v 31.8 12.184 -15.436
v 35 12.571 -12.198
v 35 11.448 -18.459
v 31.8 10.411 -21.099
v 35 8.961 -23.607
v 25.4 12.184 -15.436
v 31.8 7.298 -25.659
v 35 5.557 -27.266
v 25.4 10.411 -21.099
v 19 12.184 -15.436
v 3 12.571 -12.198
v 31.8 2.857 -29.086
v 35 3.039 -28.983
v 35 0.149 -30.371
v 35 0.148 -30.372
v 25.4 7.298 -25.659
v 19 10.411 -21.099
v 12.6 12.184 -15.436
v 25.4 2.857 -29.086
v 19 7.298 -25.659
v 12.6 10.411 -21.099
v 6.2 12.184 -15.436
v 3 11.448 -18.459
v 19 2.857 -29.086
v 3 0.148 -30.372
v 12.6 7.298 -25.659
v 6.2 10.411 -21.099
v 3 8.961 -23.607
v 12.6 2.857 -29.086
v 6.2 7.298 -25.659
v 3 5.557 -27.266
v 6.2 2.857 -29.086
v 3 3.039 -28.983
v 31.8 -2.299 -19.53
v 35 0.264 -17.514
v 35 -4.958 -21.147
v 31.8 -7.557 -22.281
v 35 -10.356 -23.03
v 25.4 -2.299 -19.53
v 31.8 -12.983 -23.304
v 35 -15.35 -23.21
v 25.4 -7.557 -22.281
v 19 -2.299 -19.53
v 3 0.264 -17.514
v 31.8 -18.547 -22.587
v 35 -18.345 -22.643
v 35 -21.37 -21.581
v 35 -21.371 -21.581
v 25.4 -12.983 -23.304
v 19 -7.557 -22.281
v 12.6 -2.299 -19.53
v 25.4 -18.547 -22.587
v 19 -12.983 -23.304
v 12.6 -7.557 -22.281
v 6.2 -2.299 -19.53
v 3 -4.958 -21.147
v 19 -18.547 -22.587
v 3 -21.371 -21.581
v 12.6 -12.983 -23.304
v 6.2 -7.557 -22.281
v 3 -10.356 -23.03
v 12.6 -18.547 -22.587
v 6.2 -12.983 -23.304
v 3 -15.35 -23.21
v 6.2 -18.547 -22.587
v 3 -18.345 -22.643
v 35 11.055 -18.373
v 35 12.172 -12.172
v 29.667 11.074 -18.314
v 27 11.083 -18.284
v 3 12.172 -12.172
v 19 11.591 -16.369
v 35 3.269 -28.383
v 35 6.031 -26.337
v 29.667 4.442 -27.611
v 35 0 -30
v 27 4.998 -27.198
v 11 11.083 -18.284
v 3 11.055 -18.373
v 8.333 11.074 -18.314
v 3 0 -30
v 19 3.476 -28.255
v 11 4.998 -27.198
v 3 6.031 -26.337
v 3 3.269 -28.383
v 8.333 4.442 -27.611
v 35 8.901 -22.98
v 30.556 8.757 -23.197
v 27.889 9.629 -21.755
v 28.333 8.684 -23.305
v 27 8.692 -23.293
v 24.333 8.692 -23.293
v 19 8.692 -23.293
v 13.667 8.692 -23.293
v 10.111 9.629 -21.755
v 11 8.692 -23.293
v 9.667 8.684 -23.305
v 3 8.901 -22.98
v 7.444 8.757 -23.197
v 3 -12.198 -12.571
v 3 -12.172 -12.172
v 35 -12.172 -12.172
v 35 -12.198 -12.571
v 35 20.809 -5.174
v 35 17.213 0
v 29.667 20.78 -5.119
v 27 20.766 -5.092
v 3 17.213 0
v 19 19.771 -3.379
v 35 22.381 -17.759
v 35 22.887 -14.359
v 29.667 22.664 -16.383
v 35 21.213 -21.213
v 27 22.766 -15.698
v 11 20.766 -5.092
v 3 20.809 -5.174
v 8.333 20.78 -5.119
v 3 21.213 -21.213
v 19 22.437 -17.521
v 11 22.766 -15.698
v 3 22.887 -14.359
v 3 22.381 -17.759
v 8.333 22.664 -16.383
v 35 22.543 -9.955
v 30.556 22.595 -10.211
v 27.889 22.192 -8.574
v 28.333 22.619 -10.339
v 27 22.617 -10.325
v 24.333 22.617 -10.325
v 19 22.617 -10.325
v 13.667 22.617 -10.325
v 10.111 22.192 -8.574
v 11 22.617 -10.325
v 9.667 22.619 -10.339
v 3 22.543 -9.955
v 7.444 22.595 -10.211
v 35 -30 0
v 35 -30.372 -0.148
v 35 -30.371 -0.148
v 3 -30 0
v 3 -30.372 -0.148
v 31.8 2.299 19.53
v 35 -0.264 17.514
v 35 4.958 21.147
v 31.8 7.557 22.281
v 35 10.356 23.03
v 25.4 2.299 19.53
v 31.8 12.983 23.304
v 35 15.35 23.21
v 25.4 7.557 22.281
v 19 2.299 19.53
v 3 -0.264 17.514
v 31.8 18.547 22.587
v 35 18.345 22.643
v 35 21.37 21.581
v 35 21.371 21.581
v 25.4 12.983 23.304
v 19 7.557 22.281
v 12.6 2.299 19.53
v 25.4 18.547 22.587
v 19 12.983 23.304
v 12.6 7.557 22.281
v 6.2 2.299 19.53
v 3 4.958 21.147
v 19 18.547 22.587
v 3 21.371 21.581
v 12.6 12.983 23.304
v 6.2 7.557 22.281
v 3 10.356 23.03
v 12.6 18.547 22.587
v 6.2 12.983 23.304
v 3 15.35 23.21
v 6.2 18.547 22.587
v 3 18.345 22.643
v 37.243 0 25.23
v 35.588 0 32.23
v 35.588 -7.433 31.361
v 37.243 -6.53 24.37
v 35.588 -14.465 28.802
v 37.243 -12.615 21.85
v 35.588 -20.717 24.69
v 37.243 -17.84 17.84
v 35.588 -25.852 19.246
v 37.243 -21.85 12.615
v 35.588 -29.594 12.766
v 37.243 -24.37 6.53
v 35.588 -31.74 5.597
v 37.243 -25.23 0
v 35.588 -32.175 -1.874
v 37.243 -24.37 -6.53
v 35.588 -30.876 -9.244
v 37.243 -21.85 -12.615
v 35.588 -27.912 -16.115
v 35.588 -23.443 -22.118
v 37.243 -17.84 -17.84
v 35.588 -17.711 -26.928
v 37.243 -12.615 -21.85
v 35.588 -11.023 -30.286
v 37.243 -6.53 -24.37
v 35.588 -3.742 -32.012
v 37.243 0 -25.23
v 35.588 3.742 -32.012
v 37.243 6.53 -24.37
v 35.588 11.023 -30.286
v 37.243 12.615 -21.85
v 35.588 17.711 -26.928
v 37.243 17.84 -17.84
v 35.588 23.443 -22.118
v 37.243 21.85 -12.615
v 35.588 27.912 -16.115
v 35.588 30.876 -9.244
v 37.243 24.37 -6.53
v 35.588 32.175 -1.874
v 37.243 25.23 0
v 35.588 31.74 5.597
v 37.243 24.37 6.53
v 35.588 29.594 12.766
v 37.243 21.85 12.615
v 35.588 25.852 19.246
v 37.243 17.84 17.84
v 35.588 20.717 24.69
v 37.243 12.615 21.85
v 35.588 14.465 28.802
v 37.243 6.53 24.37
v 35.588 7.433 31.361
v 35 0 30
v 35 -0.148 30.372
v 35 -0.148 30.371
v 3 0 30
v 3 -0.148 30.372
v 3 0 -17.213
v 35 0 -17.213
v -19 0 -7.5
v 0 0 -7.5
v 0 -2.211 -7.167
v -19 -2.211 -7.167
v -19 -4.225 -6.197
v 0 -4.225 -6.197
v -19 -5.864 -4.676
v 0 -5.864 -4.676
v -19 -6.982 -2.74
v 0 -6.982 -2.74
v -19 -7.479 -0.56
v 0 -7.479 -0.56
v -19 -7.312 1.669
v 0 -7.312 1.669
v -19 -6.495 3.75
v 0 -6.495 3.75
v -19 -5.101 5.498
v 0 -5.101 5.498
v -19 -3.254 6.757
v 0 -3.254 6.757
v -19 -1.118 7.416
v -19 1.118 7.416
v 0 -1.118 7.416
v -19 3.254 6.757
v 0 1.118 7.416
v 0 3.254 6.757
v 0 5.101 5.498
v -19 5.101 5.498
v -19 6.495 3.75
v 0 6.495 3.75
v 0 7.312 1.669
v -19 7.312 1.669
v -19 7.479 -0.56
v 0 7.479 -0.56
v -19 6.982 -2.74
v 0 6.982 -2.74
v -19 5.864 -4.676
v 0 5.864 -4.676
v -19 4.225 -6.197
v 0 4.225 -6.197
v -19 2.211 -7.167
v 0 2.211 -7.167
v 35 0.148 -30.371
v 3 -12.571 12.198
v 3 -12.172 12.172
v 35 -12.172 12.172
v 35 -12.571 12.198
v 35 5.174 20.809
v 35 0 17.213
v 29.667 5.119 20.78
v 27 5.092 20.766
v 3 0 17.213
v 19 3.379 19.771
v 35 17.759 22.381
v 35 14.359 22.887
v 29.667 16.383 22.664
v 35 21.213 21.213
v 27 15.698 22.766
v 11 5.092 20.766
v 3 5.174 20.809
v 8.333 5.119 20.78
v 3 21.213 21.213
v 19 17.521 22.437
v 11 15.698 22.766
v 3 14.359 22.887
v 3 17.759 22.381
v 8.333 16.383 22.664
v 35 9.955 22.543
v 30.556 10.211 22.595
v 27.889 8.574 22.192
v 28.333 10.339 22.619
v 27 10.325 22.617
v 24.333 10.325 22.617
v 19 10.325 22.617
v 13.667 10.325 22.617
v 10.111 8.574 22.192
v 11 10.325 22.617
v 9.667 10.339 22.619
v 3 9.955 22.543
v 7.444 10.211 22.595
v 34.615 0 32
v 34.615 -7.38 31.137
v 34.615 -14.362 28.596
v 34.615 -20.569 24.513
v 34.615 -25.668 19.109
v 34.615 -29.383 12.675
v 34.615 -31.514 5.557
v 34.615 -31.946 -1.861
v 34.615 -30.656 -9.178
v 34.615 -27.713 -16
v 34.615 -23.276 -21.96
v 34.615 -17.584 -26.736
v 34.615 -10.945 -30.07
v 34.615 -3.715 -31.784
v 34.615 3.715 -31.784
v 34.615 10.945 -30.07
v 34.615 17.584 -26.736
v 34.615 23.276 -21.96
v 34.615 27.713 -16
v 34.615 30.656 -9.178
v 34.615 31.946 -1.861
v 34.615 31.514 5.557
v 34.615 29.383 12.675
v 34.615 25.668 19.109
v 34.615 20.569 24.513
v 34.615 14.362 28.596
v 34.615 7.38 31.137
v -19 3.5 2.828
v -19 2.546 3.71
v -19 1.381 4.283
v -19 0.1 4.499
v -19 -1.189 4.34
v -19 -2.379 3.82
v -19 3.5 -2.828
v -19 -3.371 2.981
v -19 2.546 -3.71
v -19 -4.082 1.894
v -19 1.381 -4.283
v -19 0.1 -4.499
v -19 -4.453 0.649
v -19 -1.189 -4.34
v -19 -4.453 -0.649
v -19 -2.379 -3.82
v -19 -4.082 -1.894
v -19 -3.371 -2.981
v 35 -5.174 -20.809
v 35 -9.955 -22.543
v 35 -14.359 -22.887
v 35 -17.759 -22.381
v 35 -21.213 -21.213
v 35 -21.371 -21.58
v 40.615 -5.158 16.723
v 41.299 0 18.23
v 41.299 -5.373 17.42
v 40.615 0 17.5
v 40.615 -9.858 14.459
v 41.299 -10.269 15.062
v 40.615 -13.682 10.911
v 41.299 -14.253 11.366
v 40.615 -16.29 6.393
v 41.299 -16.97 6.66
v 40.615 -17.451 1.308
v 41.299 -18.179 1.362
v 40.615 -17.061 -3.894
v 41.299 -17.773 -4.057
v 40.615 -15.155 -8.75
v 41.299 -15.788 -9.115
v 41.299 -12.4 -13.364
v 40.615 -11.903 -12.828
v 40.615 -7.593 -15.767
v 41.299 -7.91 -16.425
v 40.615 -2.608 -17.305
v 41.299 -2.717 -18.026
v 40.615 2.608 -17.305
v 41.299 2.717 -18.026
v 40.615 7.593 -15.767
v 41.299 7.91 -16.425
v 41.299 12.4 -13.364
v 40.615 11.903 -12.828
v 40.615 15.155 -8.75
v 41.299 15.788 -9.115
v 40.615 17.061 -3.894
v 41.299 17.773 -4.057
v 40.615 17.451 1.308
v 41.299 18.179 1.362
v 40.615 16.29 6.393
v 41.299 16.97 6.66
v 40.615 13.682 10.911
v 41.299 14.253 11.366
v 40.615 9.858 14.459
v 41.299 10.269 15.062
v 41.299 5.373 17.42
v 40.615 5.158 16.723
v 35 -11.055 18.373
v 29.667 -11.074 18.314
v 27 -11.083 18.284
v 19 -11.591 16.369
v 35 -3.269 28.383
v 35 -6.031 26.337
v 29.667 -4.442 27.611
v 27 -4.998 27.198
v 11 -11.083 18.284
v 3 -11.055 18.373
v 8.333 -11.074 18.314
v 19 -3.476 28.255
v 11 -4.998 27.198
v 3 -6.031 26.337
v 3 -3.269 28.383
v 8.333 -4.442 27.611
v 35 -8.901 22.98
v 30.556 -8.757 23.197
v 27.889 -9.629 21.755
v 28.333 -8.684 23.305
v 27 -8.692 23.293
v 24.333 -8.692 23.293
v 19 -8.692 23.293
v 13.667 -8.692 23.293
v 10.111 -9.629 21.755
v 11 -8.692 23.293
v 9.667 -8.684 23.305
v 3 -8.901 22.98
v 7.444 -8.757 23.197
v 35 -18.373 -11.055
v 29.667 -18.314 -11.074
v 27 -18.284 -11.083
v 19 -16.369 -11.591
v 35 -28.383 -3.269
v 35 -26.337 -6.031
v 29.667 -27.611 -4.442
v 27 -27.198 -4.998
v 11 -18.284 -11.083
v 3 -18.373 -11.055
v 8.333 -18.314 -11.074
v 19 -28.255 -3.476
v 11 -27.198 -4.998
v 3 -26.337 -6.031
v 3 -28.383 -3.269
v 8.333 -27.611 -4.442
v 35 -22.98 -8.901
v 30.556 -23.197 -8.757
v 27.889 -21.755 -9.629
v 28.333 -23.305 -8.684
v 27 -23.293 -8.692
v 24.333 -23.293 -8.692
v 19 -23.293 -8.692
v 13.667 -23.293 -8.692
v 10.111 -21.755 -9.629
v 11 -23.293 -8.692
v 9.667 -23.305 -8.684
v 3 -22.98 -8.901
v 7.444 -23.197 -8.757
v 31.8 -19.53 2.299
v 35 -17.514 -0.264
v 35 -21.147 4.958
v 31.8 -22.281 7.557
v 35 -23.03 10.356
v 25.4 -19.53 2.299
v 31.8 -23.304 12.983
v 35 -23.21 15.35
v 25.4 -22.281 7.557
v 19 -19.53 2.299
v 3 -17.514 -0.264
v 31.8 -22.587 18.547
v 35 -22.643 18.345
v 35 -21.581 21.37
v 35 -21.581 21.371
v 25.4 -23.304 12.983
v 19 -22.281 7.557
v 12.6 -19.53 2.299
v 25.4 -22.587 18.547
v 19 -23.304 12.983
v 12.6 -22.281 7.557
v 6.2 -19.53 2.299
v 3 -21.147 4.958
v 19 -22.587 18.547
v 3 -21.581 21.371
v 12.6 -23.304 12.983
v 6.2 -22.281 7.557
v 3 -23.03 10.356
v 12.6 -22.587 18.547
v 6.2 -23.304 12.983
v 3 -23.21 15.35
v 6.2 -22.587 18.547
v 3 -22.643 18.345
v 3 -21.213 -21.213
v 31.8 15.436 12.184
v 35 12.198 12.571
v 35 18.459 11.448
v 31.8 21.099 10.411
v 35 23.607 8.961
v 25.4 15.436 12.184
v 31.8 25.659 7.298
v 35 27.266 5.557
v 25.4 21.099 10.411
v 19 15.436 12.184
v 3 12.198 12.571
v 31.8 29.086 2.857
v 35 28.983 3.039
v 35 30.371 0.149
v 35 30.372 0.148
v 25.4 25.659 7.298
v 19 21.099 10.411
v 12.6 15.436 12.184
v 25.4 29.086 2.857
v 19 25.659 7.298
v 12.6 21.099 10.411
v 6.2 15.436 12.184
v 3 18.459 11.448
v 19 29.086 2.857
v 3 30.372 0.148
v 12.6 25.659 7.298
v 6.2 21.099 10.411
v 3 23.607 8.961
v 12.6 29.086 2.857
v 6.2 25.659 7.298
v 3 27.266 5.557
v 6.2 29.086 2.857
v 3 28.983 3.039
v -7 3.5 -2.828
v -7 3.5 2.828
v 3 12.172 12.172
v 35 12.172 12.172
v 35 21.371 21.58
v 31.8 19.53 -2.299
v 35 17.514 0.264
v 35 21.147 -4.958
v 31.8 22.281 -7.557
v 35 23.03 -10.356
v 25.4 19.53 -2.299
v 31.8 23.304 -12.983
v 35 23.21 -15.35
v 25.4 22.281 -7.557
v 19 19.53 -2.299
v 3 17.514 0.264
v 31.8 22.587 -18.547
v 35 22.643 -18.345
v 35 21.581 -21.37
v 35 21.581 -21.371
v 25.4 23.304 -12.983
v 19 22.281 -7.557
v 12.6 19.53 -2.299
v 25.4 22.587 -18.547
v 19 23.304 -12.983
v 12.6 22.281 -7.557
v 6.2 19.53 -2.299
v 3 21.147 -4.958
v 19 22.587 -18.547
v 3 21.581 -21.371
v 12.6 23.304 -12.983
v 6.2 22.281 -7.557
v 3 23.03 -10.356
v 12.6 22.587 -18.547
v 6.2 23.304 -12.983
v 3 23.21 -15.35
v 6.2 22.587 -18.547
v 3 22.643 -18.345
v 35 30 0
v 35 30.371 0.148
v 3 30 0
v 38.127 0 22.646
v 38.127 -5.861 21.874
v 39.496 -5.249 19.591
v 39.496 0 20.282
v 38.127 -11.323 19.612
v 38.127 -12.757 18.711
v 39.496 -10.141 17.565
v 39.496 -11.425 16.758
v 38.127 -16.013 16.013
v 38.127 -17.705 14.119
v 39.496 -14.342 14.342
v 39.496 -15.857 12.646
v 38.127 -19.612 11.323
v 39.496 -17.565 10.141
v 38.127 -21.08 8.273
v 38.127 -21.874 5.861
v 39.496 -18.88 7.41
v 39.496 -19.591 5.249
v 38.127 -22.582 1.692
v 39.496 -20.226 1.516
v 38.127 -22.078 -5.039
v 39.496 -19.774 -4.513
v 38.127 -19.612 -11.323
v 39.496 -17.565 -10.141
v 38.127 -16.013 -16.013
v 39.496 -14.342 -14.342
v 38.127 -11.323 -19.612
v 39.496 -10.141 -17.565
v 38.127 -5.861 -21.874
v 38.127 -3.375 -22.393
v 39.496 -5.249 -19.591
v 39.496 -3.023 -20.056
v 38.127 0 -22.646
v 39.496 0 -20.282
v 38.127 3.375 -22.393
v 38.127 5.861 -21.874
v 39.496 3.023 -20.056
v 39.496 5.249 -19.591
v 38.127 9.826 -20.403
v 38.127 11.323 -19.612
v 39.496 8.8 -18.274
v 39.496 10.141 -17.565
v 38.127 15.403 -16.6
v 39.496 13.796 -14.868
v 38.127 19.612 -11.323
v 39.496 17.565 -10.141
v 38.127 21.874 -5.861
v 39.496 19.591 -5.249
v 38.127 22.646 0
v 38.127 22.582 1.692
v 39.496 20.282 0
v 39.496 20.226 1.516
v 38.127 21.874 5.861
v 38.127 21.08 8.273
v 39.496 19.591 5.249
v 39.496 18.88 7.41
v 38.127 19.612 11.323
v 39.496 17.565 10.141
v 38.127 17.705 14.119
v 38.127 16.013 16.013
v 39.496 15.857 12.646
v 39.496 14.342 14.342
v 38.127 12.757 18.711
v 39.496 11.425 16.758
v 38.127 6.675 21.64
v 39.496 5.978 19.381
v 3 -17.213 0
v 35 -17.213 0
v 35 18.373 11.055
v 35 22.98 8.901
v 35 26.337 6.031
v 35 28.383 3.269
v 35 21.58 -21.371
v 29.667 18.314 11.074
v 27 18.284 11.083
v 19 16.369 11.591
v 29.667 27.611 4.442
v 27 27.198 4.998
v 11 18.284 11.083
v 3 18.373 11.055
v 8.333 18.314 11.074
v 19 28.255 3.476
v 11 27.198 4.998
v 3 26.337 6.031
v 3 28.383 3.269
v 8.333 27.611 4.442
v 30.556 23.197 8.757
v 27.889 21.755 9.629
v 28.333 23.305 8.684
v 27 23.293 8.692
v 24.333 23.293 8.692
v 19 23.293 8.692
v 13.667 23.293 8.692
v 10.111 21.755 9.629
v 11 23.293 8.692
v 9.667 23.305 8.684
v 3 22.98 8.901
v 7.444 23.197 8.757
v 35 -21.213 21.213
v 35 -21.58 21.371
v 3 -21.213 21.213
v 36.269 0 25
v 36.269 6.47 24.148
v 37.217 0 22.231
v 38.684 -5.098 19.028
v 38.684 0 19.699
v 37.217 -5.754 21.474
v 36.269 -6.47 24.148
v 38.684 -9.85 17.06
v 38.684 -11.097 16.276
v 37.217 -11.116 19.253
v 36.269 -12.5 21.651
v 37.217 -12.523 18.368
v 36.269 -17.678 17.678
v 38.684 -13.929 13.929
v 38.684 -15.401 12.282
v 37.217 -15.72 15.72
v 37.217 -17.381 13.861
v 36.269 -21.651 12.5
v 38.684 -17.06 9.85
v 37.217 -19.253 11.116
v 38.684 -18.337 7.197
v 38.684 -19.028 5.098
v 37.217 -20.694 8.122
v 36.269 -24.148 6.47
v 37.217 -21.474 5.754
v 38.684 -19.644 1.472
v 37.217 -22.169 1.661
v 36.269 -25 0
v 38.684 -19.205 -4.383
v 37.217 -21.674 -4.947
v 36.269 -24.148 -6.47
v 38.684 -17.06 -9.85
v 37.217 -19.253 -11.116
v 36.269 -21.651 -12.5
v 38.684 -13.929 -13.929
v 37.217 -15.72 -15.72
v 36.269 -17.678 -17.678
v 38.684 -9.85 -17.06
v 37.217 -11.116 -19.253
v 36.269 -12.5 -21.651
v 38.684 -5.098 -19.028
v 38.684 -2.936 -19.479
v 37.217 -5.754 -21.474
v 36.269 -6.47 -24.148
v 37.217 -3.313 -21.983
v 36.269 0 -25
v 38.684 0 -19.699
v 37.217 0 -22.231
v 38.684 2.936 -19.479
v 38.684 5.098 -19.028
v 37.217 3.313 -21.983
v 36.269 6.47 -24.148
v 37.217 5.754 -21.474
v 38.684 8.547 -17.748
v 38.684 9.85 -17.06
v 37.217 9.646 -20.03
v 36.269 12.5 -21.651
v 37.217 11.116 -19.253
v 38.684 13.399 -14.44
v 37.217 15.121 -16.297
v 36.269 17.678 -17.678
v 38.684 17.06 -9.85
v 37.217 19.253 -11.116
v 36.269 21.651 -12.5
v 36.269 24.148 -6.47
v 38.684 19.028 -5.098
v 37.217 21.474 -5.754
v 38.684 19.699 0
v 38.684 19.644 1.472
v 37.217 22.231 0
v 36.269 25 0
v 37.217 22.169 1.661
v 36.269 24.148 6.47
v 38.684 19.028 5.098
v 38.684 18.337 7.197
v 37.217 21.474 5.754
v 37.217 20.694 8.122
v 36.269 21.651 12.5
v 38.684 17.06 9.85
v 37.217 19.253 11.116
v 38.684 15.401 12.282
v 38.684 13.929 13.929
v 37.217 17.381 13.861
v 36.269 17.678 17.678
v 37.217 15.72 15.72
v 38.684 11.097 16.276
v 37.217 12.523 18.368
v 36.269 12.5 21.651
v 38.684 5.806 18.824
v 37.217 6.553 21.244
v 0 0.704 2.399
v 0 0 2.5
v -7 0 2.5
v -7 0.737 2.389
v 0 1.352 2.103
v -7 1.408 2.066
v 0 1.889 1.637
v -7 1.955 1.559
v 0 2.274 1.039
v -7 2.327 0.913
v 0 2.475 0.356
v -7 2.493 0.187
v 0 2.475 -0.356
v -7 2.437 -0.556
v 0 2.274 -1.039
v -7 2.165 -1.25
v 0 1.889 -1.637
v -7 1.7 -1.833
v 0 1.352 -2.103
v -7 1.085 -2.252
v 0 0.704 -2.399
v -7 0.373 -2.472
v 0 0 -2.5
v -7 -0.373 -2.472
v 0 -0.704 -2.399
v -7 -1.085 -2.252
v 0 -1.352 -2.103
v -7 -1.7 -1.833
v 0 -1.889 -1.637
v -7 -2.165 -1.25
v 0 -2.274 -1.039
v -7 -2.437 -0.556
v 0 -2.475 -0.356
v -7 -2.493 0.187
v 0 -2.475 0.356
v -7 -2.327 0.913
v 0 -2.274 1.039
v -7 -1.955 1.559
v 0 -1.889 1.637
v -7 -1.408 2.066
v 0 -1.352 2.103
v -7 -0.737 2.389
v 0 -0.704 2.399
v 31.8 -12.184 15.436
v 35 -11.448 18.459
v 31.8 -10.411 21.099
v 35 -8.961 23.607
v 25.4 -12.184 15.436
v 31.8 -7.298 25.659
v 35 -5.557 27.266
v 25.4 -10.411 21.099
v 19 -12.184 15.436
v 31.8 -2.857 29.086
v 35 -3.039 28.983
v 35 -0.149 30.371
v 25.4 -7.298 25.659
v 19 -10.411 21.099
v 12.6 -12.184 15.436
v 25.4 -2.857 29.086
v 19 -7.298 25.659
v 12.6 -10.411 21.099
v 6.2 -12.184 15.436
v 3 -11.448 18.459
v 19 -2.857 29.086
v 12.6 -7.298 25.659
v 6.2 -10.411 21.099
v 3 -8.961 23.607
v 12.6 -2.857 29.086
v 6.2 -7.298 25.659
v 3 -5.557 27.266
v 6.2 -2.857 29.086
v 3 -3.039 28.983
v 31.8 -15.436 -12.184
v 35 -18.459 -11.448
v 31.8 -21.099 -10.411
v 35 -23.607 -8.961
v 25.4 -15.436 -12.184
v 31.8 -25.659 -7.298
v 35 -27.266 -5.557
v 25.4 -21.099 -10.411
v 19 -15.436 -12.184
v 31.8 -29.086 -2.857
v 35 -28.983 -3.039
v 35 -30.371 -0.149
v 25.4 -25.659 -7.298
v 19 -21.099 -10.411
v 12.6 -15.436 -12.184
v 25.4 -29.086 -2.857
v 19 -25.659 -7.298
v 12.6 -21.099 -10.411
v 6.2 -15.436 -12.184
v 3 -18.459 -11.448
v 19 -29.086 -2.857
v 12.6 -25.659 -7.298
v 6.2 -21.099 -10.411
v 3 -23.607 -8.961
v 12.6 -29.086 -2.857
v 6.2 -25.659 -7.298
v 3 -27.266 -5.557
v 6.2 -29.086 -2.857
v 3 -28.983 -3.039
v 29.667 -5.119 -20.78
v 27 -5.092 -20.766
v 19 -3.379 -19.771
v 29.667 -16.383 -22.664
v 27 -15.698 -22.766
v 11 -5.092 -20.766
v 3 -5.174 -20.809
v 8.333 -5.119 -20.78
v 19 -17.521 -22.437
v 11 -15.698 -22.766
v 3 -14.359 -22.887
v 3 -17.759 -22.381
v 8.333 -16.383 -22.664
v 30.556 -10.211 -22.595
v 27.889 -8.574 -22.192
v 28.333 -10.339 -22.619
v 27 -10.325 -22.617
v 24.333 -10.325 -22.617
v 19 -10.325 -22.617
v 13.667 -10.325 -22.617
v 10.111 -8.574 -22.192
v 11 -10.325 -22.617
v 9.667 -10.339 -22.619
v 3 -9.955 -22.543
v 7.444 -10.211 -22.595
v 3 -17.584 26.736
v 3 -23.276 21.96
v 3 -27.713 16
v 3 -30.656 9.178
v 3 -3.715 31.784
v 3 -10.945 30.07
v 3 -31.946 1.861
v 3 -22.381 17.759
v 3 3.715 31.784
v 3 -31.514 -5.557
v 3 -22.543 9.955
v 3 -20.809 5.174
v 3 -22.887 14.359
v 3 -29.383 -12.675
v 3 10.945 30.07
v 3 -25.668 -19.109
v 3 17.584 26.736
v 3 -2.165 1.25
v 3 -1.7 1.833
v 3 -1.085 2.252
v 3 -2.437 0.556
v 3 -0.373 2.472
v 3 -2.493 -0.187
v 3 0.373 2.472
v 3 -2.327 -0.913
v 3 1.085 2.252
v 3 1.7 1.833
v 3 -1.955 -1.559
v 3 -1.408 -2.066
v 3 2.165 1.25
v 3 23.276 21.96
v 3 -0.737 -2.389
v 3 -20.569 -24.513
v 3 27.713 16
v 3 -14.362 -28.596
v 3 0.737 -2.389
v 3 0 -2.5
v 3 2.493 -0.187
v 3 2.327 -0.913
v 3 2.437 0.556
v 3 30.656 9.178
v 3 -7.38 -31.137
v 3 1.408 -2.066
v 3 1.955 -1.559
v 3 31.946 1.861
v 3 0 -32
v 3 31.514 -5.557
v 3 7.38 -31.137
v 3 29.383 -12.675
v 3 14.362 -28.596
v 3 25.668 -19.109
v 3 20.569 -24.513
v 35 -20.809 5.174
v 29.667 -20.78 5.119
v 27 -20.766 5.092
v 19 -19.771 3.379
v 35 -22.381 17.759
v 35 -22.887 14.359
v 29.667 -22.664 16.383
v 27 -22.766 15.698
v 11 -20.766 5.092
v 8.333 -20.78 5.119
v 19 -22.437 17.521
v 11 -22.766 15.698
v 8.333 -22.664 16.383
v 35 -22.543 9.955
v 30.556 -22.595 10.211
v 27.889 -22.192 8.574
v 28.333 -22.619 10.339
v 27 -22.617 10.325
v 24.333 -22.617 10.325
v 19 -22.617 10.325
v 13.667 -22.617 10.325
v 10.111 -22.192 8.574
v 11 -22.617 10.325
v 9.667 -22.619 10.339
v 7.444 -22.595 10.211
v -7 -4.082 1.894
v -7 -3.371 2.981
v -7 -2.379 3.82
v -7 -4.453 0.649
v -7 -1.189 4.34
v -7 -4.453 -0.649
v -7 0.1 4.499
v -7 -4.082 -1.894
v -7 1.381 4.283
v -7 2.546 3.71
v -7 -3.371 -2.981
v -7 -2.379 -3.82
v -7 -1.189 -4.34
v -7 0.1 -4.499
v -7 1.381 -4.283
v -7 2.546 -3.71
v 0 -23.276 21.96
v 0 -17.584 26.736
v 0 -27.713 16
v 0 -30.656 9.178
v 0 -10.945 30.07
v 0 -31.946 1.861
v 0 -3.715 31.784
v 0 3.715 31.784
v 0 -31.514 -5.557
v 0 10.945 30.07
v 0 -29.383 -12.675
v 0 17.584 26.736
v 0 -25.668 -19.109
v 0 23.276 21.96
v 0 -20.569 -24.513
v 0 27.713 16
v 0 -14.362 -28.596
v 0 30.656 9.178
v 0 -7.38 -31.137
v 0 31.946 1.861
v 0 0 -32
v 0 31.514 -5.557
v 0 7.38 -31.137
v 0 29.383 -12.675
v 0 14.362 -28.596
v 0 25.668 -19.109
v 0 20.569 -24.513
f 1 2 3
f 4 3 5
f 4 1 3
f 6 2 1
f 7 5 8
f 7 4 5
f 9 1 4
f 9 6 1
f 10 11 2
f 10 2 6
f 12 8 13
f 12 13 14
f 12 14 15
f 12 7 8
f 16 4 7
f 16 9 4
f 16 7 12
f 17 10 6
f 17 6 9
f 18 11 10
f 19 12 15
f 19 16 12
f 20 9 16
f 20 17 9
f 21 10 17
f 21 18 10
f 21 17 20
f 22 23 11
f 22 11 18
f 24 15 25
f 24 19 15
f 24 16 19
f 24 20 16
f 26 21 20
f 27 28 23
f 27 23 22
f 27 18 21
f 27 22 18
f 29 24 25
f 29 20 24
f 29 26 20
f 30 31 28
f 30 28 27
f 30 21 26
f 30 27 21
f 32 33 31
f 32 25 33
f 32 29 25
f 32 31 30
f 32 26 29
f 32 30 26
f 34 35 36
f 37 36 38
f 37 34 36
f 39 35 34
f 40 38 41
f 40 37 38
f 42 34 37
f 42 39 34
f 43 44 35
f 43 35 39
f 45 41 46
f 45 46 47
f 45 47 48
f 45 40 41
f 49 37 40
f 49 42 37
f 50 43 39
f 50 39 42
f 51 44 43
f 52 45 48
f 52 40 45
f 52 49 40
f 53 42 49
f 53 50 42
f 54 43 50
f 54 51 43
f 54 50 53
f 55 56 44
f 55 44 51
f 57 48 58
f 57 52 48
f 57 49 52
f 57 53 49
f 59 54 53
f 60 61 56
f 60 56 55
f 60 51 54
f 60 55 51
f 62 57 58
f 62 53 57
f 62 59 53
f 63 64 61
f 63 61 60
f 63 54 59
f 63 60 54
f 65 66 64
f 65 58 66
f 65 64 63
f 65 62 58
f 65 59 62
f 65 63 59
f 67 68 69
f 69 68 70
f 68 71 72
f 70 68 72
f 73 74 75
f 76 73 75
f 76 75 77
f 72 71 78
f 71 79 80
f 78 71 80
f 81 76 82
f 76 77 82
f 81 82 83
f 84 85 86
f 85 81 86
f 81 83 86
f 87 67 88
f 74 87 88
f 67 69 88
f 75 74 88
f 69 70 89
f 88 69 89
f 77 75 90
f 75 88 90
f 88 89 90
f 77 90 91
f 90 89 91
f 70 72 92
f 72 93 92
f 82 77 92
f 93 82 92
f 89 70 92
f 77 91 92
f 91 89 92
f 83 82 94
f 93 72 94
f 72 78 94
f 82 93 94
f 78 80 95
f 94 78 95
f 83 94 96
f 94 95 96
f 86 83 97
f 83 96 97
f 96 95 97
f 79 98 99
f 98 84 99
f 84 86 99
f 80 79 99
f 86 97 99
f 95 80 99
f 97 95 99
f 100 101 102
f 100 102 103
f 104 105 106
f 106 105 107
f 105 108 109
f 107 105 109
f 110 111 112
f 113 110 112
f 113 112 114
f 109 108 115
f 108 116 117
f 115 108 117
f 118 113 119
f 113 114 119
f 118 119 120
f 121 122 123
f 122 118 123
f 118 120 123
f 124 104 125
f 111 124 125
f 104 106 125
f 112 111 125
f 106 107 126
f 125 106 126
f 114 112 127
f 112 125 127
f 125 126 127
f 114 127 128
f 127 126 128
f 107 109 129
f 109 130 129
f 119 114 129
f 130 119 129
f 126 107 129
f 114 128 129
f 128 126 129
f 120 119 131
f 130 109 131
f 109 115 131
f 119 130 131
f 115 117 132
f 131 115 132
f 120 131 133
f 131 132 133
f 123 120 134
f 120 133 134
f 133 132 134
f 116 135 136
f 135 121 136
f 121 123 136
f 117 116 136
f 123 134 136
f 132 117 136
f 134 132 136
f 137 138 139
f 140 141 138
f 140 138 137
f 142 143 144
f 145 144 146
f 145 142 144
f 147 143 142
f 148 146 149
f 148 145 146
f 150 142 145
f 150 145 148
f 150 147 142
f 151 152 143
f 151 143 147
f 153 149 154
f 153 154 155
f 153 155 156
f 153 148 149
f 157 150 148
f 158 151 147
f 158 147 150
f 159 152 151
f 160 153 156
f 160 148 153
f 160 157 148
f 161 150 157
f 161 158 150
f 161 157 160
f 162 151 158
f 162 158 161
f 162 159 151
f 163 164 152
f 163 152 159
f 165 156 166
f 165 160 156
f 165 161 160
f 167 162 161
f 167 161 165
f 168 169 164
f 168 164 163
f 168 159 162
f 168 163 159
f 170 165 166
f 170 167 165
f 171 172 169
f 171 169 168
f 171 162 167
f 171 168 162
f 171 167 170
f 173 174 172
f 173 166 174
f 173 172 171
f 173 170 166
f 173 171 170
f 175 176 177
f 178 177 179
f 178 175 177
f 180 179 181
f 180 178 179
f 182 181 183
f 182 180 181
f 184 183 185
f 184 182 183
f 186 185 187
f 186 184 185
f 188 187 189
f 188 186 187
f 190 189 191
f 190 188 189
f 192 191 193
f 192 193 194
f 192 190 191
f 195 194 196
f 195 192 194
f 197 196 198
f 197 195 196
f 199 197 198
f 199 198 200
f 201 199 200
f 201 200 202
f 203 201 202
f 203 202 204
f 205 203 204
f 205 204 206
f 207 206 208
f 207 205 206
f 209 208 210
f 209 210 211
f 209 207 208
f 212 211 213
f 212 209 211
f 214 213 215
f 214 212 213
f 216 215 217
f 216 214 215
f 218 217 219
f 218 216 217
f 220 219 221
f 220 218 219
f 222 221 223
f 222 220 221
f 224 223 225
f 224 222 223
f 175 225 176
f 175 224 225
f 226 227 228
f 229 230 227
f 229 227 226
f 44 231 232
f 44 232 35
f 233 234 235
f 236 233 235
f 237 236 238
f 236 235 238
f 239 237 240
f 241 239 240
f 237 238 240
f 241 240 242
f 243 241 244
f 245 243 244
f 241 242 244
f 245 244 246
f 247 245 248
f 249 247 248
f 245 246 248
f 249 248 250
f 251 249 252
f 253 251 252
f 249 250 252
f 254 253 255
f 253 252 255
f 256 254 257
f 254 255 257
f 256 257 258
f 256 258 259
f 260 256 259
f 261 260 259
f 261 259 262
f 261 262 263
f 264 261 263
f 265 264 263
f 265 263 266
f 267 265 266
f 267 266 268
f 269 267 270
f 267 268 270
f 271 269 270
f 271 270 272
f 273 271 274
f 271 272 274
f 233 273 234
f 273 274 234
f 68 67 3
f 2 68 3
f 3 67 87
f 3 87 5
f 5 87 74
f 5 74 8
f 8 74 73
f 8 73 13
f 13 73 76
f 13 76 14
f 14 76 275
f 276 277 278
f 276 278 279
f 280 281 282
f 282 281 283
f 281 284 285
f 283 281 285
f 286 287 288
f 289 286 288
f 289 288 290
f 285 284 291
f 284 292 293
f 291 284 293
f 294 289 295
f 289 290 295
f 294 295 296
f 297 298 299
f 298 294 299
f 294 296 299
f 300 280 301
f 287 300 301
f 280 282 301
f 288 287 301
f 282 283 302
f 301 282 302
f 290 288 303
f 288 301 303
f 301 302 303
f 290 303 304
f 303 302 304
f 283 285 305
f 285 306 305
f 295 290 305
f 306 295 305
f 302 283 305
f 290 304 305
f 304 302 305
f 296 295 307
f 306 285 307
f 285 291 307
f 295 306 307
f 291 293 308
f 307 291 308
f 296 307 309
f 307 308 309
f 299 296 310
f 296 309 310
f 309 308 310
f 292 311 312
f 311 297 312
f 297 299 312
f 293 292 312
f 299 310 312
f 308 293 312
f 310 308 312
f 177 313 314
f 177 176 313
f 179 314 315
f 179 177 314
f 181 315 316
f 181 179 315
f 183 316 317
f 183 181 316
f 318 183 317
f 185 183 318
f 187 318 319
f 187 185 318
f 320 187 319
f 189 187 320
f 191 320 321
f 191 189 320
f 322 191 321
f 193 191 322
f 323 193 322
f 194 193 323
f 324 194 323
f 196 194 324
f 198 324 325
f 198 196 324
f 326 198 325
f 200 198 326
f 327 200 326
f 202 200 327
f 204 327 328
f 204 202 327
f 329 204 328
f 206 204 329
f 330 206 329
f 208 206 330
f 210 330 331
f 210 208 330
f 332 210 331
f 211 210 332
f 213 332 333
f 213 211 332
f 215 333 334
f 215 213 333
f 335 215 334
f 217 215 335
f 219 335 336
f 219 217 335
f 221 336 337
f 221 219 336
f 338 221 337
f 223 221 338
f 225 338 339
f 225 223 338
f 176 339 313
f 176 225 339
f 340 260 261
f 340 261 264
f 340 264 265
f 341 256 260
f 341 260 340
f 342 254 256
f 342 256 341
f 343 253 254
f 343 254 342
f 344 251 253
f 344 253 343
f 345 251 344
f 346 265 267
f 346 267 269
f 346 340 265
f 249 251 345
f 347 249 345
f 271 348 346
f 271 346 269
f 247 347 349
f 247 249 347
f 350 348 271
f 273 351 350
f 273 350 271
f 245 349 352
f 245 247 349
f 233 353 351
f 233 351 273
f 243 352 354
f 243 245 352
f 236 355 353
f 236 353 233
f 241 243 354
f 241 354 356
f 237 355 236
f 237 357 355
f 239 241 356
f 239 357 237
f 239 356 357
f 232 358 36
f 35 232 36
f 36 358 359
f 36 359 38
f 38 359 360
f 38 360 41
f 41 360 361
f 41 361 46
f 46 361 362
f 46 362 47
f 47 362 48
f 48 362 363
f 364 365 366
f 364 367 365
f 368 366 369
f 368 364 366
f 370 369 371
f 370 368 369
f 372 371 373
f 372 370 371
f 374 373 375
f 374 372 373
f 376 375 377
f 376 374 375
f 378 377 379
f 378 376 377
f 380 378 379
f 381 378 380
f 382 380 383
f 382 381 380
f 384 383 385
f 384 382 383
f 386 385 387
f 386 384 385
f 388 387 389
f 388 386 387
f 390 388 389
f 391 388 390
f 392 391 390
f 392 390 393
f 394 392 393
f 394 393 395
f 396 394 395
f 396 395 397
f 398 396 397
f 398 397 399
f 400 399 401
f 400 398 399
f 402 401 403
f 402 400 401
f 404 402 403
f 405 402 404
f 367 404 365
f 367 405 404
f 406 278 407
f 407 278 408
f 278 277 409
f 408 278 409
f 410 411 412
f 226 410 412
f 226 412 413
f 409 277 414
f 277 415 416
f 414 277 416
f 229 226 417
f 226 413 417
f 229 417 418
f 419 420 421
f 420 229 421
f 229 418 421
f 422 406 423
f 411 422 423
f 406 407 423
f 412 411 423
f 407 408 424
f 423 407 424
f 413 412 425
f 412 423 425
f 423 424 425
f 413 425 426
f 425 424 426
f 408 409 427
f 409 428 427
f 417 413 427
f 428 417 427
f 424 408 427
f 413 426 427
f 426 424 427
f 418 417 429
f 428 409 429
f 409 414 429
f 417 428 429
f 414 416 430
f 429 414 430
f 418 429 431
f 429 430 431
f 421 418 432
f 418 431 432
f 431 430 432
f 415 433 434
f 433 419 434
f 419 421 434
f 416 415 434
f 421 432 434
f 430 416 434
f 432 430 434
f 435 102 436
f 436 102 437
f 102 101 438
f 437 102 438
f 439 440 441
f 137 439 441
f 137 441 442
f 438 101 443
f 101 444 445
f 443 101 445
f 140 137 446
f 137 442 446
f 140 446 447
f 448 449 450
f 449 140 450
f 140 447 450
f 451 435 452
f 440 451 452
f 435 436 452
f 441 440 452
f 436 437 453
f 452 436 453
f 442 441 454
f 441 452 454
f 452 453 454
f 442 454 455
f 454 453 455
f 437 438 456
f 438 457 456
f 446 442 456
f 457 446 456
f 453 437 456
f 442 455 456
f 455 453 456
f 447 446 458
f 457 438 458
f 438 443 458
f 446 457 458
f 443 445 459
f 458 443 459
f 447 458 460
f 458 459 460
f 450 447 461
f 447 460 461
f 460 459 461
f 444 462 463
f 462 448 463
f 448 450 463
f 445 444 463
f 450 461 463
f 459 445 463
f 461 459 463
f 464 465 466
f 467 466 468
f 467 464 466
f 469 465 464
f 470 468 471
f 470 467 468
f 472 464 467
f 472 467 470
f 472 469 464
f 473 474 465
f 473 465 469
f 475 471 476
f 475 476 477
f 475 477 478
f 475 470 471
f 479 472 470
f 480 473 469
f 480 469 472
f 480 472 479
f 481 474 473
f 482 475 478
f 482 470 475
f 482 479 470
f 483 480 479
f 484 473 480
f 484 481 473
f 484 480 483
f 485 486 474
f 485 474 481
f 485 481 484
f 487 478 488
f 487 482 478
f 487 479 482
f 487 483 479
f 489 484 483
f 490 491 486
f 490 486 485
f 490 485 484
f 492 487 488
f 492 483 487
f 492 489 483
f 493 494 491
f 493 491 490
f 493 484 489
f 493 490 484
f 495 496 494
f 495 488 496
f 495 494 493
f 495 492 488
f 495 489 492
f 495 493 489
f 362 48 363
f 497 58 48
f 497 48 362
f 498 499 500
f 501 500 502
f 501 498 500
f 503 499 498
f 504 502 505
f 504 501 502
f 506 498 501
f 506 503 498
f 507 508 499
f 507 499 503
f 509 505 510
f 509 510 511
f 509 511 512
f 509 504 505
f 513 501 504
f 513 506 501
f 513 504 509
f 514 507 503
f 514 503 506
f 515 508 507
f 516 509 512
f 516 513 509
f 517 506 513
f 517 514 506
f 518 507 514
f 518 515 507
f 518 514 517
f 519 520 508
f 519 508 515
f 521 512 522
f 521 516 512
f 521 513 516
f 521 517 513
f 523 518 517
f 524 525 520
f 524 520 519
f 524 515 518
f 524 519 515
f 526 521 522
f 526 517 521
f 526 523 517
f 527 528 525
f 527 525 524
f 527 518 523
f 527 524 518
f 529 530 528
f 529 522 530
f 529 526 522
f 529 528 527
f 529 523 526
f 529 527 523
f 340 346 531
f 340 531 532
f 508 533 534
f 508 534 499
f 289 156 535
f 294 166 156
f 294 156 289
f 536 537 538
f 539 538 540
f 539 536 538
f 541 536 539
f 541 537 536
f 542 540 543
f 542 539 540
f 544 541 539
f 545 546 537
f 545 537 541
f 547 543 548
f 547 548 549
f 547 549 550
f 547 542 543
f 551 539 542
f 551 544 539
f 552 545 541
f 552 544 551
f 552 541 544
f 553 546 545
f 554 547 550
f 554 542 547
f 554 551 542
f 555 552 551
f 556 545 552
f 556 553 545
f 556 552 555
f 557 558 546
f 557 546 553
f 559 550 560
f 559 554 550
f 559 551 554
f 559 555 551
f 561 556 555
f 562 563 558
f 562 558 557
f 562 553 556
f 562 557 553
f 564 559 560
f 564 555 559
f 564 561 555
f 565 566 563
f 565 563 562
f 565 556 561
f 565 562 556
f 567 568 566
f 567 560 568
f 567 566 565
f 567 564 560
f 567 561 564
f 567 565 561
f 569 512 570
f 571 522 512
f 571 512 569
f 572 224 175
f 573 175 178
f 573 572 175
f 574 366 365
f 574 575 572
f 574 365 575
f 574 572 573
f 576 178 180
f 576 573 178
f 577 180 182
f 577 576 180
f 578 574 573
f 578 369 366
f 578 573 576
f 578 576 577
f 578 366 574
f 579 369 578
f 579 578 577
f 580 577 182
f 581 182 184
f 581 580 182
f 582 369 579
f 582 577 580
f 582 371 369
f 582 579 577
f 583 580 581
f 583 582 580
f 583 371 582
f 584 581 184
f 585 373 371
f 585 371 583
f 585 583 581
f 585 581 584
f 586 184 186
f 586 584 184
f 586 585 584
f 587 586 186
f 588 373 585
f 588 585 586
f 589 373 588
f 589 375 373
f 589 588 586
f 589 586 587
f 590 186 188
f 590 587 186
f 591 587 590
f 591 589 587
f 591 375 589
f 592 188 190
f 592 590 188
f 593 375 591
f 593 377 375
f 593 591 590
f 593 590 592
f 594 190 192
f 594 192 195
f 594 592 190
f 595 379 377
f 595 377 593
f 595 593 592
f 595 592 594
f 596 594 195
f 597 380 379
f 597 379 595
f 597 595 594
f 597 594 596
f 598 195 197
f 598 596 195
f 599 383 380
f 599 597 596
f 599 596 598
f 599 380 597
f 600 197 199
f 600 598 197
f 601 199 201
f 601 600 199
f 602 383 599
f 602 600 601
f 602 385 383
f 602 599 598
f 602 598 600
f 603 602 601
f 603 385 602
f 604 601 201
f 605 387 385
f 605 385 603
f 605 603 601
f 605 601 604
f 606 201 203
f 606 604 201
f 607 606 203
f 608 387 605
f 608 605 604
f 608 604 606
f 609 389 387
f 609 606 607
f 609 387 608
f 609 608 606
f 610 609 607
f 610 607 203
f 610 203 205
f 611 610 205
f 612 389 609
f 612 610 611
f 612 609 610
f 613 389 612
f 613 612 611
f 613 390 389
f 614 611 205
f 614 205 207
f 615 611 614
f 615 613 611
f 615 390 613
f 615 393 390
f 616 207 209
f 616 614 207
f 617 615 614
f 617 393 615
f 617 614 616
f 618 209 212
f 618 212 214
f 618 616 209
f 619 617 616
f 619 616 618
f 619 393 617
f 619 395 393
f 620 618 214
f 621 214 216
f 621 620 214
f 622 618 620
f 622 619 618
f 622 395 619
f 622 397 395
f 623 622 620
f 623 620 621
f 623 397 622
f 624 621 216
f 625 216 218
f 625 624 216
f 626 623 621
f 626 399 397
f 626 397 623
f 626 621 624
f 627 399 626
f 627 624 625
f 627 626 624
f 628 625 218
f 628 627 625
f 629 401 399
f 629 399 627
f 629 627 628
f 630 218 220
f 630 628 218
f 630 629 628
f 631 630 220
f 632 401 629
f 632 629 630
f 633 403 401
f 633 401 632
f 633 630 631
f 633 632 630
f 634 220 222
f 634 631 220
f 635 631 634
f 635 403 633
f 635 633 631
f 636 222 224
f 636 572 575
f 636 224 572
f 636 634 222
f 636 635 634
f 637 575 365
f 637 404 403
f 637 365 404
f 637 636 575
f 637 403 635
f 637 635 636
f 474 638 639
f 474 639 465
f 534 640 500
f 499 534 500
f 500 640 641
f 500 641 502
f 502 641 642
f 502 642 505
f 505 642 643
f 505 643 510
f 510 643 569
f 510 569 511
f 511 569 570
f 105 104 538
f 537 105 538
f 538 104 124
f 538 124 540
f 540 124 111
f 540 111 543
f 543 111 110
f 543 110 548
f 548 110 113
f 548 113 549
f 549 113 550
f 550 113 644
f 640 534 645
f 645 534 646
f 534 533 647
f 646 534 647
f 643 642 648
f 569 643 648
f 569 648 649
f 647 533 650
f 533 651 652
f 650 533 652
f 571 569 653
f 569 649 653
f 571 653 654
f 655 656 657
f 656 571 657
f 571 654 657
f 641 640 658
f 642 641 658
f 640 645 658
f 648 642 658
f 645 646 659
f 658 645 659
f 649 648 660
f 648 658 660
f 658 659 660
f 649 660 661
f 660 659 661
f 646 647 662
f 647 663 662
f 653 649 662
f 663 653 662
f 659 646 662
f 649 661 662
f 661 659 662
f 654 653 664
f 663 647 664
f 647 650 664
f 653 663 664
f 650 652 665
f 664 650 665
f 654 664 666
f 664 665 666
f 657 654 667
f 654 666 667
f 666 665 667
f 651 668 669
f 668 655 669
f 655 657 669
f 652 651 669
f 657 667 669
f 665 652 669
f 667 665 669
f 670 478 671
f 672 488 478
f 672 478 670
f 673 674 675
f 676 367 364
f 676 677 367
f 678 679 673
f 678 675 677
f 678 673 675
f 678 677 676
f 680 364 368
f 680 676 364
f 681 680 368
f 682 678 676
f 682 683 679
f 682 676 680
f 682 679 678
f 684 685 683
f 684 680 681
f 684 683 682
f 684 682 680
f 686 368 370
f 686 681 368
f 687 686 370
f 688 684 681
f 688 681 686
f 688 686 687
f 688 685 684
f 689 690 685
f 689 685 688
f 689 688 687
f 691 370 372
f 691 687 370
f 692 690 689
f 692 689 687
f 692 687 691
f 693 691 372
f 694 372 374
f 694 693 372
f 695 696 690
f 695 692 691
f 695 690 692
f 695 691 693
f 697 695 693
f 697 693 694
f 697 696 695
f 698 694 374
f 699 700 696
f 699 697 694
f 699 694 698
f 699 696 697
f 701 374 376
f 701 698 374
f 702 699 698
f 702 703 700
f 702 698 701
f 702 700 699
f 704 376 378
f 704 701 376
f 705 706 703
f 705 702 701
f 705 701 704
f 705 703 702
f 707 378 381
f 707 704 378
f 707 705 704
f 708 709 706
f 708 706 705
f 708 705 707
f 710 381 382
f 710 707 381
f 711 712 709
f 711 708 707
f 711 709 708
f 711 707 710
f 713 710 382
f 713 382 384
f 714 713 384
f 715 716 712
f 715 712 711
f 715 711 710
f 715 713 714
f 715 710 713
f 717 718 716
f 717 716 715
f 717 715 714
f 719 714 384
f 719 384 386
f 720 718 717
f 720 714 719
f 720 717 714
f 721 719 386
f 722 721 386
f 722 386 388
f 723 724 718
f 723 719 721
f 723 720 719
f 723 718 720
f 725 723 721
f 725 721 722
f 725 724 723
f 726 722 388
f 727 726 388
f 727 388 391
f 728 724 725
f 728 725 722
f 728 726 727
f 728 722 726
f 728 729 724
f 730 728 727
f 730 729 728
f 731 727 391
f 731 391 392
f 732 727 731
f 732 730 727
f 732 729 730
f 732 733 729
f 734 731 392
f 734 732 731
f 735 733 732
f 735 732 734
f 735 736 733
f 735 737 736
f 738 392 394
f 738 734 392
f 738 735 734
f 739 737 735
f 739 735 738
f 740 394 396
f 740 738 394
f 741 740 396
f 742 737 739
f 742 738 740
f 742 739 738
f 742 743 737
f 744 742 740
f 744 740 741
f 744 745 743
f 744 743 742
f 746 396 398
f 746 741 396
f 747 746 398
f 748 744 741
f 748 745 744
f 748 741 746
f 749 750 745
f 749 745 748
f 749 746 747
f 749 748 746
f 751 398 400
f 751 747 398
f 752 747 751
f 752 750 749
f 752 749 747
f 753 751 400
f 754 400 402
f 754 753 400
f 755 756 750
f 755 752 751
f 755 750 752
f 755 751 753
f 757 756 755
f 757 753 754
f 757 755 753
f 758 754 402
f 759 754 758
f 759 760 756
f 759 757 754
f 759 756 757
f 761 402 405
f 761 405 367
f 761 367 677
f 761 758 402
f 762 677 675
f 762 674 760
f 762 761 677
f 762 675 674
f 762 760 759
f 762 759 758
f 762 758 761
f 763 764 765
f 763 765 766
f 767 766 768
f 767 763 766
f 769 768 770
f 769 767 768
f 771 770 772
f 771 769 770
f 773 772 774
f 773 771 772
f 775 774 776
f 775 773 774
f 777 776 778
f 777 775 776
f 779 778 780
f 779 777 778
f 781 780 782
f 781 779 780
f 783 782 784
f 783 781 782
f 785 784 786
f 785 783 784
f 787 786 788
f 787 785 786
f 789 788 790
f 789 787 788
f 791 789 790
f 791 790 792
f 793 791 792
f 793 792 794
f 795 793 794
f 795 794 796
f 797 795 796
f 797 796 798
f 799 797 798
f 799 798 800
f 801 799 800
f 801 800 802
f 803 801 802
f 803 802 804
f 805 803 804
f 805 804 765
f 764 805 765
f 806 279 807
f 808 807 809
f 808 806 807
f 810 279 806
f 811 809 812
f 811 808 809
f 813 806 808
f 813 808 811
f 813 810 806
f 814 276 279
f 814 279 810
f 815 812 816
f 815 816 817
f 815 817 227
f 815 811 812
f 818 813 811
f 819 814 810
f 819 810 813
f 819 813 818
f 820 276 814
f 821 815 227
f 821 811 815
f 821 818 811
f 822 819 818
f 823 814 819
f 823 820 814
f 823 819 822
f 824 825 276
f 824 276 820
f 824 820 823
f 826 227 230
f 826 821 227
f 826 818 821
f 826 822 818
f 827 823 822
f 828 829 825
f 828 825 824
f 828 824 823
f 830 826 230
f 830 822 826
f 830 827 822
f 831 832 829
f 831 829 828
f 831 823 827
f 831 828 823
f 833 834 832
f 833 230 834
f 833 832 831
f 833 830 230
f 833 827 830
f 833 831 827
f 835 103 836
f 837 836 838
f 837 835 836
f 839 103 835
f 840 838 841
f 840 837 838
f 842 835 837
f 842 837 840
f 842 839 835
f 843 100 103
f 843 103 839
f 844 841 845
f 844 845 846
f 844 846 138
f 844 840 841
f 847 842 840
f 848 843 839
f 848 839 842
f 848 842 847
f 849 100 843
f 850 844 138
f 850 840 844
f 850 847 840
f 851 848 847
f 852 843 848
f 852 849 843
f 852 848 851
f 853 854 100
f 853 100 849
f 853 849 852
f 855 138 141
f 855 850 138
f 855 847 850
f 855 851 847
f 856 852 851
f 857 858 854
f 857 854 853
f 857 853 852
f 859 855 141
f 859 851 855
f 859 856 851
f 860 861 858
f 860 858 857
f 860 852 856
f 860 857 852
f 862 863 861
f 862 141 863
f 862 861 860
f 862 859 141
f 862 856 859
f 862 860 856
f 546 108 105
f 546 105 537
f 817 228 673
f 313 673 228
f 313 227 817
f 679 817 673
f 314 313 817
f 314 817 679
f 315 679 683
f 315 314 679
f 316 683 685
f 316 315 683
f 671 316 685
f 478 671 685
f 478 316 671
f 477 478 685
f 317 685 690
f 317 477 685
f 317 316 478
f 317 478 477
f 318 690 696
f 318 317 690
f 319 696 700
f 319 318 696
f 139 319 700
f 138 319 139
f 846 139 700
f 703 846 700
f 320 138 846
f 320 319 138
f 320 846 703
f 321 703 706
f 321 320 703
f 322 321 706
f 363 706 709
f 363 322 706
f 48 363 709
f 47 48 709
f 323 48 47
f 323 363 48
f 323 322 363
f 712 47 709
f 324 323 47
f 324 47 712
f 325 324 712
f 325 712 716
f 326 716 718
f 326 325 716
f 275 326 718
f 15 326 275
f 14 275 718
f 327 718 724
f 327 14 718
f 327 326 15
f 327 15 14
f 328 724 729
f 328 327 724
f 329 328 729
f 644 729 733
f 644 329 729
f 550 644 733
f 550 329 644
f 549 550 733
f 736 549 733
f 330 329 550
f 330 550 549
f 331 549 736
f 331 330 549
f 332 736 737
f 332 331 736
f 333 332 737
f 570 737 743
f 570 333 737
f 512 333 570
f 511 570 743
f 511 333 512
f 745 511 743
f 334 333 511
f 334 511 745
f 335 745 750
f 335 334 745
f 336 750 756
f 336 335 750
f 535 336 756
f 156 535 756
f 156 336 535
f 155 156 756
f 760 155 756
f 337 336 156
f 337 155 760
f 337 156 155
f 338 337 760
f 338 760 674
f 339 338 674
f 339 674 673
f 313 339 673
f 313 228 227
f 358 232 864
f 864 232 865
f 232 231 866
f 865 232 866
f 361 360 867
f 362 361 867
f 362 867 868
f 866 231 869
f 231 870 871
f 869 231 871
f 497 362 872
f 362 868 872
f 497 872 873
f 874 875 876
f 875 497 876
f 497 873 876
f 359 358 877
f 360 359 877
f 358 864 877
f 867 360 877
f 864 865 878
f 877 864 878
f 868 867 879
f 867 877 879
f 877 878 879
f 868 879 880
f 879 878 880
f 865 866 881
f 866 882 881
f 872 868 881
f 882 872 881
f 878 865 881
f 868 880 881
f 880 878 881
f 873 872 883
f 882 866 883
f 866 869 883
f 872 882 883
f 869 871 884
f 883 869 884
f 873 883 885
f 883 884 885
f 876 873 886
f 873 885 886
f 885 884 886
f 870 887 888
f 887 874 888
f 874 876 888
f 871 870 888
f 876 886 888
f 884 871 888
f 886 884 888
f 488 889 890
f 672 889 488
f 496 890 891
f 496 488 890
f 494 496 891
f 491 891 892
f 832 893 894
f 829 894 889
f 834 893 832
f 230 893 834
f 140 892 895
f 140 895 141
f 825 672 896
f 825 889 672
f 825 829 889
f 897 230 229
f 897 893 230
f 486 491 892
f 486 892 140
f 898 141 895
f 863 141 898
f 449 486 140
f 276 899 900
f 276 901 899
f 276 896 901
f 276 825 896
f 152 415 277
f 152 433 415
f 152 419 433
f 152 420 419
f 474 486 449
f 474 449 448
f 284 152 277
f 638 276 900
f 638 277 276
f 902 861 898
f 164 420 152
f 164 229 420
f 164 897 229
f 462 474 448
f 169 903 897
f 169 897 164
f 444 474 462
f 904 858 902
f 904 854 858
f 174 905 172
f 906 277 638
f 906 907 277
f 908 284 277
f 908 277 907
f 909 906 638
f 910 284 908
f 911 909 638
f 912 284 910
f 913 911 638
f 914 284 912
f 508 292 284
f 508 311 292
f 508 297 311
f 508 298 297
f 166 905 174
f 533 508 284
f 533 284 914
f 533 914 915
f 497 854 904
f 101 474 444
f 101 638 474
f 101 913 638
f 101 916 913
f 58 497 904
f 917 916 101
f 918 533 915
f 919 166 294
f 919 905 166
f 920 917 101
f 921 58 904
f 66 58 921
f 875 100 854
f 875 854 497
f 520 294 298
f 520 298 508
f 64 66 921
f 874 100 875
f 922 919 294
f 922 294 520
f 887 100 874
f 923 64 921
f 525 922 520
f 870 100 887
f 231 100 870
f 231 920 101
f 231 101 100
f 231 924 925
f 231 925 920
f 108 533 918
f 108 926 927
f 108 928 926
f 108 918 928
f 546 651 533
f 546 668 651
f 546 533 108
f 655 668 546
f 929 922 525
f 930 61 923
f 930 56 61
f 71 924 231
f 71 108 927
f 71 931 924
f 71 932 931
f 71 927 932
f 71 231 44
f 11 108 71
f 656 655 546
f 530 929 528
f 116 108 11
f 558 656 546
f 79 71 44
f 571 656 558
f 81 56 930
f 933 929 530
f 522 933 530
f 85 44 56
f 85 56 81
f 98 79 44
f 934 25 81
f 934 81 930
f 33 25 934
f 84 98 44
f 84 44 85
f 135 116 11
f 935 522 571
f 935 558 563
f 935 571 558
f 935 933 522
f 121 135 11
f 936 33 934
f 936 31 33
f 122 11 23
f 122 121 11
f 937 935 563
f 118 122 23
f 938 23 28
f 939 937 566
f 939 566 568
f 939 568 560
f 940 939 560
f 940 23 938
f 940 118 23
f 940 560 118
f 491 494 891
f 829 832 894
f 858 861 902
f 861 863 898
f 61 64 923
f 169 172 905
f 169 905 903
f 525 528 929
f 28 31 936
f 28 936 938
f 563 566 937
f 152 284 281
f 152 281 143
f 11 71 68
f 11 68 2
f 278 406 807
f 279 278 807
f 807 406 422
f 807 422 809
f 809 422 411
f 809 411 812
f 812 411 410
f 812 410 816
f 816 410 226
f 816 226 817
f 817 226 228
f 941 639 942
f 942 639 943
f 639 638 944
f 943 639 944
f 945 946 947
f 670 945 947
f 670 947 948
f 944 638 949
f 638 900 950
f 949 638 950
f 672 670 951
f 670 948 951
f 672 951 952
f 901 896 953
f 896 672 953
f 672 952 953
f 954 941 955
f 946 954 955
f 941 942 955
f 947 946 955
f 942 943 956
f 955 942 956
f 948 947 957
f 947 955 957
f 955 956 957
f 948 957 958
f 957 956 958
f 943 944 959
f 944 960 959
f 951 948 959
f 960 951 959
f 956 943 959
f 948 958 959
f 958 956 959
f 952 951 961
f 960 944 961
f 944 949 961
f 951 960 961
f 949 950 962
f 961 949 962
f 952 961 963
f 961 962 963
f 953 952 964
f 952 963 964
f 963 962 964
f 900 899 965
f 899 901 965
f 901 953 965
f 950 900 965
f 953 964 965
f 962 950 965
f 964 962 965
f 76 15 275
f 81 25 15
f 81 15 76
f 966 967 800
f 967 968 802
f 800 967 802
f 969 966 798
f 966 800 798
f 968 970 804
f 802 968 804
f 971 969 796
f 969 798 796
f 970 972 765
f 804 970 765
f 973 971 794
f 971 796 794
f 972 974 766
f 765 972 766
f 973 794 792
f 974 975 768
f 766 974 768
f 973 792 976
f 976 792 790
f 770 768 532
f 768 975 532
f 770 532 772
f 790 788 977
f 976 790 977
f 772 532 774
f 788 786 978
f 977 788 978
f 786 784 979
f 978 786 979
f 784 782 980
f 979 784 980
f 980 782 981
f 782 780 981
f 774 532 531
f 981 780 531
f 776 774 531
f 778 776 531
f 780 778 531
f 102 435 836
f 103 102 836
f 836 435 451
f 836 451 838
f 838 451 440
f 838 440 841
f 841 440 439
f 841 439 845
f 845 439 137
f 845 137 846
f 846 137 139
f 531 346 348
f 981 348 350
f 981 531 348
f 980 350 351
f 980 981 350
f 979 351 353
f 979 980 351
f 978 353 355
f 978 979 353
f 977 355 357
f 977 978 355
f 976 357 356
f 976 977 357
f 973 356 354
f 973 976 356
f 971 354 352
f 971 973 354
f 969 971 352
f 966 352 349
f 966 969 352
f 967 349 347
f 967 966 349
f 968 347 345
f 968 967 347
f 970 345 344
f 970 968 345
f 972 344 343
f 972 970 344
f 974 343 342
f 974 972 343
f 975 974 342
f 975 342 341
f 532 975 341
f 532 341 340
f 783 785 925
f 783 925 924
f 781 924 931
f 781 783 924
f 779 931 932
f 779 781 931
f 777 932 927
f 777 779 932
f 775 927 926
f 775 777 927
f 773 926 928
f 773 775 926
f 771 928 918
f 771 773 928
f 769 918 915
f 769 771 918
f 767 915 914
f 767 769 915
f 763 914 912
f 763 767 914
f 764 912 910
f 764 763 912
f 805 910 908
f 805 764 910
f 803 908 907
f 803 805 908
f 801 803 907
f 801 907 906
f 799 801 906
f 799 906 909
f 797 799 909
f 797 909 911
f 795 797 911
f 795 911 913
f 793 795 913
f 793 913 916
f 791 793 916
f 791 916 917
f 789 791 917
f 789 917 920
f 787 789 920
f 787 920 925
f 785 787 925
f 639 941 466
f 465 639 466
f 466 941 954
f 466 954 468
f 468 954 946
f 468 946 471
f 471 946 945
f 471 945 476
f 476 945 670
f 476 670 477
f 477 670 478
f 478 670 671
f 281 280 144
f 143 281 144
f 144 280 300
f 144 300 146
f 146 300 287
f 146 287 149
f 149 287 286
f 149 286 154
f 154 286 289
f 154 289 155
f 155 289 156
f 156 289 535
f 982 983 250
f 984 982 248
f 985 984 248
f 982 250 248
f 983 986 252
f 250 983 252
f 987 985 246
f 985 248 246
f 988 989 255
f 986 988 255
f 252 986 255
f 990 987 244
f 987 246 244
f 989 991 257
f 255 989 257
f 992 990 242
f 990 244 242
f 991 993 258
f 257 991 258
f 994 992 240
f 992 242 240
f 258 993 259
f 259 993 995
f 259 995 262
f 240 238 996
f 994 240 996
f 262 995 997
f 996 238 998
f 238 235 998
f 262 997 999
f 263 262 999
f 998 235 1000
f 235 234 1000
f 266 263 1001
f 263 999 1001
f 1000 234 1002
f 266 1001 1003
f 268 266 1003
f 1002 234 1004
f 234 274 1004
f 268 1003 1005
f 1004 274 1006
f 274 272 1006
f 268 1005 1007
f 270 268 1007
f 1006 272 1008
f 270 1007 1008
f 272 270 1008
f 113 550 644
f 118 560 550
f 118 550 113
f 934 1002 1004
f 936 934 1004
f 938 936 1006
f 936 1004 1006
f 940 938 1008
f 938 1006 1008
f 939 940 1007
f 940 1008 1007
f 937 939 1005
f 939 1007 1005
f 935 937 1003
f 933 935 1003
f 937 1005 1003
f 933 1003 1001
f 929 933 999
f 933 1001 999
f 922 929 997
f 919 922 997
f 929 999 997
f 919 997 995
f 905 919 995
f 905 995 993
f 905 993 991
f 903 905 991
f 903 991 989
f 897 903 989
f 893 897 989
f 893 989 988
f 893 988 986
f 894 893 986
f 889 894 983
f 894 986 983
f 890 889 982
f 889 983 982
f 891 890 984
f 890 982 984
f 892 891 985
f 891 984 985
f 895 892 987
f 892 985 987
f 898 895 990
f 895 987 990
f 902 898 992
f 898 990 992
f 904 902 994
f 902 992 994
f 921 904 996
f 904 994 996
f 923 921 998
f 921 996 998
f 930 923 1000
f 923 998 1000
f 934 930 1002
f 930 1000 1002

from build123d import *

# Parameters (mm, degrees)
SKETCH1_R           = 32
SKETCH1_R_2         = 2.5
BOSS_EXTRUDE1_DEPTH = 3
SKETCH2_R           = 7.5
SKETCH2_R_2         = 4.5
BOSS_EXTRUDE2_DEPTH = 19
BOSS_EXTRUDE3_REACH = 52.319
SKETCH3_W           = 5.65685425
SKETCH3_H           = 1
BOSS_EXTRUDE4_DEPTH = 32
CIRPATTERN1_COUNT   = 8
SKETCH6_R           = 2.5
BOSS_EXTRUDE5_DEPTH = 7


with BuildPart() as part:
    # Sketch1 → Boss-Extrude1 (new body)
    with BuildSketch(Plane(origin=(0, 0, 0), x_dir=(0, 0, -1), z_dir=(1, 0, 0))):
        Circle(SKETCH1_R)
        Circle(SKETCH1_R_2, mode=Mode.SUBTRACT)
    extrude(amount=BOSS_EXTRUDE1_DEPTH)

    # Sketch2 → Boss-Extrude2 (add)
    with BuildSketch(Plane.ZY):
        with Locations(Location((0, 0, 0), (0, 0, 180))):
            Circle(SKETCH2_R)
        Circle(SKETCH2_R_2, mode=Mode.SUBTRACT)
    extrude(amount=BOSS_EXTRUDE2_DEPTH)

    # Sketch3 → Boss-Extrude3 (add, up to next)
    with BuildSketch(Plane.ZY.offset(19), mode=Mode.PRIVATE) as boss_extrude3_sk1:
        with Locations((0, 4)):
            Rectangle(SKETCH3_W, SKETCH3_H)
    boss_extrude3_tool1 = extrude(boss_extrude3_sk1.sketch, amount=-BOSS_EXTRUDE3_REACH, mode=Mode.PRIVATE) - part.part
    add(boss_extrude3_tool1.solids().sort_by_distance((-19, 4, 0))[0])

    # Sketch4 → Boss-Extrude4 (add)
    with BuildSketch(Plane(origin=(3, 0, 0), x_dir=(0, 0, -1), z_dir=(1, 0, 0))):
        with BuildLine():
            Line((-21.58062512, 21.371321447), (-21.213203436, 21.213203436))
            add(Edge.make_bspline(
                [(-17.213203436, 0), (-26.020436099, 10.042549877), (-21.213203436, 21.213203436)],
                knots=[0, 0, 0, 1, 1, 1], degree=2))
            Line((-17.213203436, 0), (-17.51393709, -0.263740912))
            add(Edge.make_bspline(
                [(-17.51393709, -0.263740912), (-17.878739931, 0.152229786), (-18.596038958, 1.014035776), (-19.864700537, 2.724543787), (-21.192406768, 4.899599509), (-22.353083802, 7.549867519), (-23.082449138, 10.243922617), (-23.376476666, 12.977185386), (-23.235283471, 15.743890699), (-22.754370885, 18.077638215), (-22.157022424, 19.951191708), (-21.781093763, 20.905488834), (-21.58062512, 21.371321447)],
                knots=[0, 0, 0, 0, 0.0625, 0.125, 0.25, 0.375, 0.5, 0.625, 0.75, 0.875, 0.9375, 1, 1, 1, 1], degree=3))
        make_face()
    boss_extrude4 = extrude(amount=BOSS_EXTRUDE4_DEPTH)

    # CirPattern1: Boss-Extrude4 ×8 about axis
    cirpattern1_axis = Axis((3, 0, 0), (-1, 0, 0))
    for i in range(1, CIRPATTERN1_COUNT):
        add(boss_extrude4.rotate(cirpattern1_axis, i * 360 / CIRPATTERN1_COUNT))

    # Sketch5 → Revolve1 (revolve)
    with BuildSketch(Plane.XY, mode=Mode.PRIVATE) as revolve1_sk:
        with BuildLine():
            Line((36.269359104, 25), (34.615197821, 32))
            Line((34.615197821, 32), (35.588394389, 32.229974869))
            Line((35.588394389, 32.229974869), (37.242555672, 25.229974869))
            ThreePointArc((37.242555672, 25.229974869), (38.753955113, 21.430599527), (41.298671808, 18.229974869))
            Line((41.298671808, 18.229974869), (40.615197821, 17.5))
            ThreePointArc((40.615197821, 17.5), (37.888715648, 20.929240705), (36.269359104, 25))
        make_face()
    revolve(revolve1_sk.sketch.rotate(Axis((-14.357829548, 0, 0), (1, 0, 0)), 90), axis=Axis((-14.357829548, 0, 0), (1, 0, 0)))

    # Sketch6 → Boss-Extrude5 (add)
    with BuildSketch(Plane.ZY):
        with BuildLine():
            Line((-2.828427125, 3.5), (2.828427125, 3.5))
            ThreePointArc((2.828427125, 3.5), (0, -4.5), (-2.828427125, 3.5))
        make_face()
        Circle(SKETCH6_R, mode=Mode.SUBTRACT)
    extrude(amount=BOSS_EXTRUDE5_DEPTH)


solid = part.part
